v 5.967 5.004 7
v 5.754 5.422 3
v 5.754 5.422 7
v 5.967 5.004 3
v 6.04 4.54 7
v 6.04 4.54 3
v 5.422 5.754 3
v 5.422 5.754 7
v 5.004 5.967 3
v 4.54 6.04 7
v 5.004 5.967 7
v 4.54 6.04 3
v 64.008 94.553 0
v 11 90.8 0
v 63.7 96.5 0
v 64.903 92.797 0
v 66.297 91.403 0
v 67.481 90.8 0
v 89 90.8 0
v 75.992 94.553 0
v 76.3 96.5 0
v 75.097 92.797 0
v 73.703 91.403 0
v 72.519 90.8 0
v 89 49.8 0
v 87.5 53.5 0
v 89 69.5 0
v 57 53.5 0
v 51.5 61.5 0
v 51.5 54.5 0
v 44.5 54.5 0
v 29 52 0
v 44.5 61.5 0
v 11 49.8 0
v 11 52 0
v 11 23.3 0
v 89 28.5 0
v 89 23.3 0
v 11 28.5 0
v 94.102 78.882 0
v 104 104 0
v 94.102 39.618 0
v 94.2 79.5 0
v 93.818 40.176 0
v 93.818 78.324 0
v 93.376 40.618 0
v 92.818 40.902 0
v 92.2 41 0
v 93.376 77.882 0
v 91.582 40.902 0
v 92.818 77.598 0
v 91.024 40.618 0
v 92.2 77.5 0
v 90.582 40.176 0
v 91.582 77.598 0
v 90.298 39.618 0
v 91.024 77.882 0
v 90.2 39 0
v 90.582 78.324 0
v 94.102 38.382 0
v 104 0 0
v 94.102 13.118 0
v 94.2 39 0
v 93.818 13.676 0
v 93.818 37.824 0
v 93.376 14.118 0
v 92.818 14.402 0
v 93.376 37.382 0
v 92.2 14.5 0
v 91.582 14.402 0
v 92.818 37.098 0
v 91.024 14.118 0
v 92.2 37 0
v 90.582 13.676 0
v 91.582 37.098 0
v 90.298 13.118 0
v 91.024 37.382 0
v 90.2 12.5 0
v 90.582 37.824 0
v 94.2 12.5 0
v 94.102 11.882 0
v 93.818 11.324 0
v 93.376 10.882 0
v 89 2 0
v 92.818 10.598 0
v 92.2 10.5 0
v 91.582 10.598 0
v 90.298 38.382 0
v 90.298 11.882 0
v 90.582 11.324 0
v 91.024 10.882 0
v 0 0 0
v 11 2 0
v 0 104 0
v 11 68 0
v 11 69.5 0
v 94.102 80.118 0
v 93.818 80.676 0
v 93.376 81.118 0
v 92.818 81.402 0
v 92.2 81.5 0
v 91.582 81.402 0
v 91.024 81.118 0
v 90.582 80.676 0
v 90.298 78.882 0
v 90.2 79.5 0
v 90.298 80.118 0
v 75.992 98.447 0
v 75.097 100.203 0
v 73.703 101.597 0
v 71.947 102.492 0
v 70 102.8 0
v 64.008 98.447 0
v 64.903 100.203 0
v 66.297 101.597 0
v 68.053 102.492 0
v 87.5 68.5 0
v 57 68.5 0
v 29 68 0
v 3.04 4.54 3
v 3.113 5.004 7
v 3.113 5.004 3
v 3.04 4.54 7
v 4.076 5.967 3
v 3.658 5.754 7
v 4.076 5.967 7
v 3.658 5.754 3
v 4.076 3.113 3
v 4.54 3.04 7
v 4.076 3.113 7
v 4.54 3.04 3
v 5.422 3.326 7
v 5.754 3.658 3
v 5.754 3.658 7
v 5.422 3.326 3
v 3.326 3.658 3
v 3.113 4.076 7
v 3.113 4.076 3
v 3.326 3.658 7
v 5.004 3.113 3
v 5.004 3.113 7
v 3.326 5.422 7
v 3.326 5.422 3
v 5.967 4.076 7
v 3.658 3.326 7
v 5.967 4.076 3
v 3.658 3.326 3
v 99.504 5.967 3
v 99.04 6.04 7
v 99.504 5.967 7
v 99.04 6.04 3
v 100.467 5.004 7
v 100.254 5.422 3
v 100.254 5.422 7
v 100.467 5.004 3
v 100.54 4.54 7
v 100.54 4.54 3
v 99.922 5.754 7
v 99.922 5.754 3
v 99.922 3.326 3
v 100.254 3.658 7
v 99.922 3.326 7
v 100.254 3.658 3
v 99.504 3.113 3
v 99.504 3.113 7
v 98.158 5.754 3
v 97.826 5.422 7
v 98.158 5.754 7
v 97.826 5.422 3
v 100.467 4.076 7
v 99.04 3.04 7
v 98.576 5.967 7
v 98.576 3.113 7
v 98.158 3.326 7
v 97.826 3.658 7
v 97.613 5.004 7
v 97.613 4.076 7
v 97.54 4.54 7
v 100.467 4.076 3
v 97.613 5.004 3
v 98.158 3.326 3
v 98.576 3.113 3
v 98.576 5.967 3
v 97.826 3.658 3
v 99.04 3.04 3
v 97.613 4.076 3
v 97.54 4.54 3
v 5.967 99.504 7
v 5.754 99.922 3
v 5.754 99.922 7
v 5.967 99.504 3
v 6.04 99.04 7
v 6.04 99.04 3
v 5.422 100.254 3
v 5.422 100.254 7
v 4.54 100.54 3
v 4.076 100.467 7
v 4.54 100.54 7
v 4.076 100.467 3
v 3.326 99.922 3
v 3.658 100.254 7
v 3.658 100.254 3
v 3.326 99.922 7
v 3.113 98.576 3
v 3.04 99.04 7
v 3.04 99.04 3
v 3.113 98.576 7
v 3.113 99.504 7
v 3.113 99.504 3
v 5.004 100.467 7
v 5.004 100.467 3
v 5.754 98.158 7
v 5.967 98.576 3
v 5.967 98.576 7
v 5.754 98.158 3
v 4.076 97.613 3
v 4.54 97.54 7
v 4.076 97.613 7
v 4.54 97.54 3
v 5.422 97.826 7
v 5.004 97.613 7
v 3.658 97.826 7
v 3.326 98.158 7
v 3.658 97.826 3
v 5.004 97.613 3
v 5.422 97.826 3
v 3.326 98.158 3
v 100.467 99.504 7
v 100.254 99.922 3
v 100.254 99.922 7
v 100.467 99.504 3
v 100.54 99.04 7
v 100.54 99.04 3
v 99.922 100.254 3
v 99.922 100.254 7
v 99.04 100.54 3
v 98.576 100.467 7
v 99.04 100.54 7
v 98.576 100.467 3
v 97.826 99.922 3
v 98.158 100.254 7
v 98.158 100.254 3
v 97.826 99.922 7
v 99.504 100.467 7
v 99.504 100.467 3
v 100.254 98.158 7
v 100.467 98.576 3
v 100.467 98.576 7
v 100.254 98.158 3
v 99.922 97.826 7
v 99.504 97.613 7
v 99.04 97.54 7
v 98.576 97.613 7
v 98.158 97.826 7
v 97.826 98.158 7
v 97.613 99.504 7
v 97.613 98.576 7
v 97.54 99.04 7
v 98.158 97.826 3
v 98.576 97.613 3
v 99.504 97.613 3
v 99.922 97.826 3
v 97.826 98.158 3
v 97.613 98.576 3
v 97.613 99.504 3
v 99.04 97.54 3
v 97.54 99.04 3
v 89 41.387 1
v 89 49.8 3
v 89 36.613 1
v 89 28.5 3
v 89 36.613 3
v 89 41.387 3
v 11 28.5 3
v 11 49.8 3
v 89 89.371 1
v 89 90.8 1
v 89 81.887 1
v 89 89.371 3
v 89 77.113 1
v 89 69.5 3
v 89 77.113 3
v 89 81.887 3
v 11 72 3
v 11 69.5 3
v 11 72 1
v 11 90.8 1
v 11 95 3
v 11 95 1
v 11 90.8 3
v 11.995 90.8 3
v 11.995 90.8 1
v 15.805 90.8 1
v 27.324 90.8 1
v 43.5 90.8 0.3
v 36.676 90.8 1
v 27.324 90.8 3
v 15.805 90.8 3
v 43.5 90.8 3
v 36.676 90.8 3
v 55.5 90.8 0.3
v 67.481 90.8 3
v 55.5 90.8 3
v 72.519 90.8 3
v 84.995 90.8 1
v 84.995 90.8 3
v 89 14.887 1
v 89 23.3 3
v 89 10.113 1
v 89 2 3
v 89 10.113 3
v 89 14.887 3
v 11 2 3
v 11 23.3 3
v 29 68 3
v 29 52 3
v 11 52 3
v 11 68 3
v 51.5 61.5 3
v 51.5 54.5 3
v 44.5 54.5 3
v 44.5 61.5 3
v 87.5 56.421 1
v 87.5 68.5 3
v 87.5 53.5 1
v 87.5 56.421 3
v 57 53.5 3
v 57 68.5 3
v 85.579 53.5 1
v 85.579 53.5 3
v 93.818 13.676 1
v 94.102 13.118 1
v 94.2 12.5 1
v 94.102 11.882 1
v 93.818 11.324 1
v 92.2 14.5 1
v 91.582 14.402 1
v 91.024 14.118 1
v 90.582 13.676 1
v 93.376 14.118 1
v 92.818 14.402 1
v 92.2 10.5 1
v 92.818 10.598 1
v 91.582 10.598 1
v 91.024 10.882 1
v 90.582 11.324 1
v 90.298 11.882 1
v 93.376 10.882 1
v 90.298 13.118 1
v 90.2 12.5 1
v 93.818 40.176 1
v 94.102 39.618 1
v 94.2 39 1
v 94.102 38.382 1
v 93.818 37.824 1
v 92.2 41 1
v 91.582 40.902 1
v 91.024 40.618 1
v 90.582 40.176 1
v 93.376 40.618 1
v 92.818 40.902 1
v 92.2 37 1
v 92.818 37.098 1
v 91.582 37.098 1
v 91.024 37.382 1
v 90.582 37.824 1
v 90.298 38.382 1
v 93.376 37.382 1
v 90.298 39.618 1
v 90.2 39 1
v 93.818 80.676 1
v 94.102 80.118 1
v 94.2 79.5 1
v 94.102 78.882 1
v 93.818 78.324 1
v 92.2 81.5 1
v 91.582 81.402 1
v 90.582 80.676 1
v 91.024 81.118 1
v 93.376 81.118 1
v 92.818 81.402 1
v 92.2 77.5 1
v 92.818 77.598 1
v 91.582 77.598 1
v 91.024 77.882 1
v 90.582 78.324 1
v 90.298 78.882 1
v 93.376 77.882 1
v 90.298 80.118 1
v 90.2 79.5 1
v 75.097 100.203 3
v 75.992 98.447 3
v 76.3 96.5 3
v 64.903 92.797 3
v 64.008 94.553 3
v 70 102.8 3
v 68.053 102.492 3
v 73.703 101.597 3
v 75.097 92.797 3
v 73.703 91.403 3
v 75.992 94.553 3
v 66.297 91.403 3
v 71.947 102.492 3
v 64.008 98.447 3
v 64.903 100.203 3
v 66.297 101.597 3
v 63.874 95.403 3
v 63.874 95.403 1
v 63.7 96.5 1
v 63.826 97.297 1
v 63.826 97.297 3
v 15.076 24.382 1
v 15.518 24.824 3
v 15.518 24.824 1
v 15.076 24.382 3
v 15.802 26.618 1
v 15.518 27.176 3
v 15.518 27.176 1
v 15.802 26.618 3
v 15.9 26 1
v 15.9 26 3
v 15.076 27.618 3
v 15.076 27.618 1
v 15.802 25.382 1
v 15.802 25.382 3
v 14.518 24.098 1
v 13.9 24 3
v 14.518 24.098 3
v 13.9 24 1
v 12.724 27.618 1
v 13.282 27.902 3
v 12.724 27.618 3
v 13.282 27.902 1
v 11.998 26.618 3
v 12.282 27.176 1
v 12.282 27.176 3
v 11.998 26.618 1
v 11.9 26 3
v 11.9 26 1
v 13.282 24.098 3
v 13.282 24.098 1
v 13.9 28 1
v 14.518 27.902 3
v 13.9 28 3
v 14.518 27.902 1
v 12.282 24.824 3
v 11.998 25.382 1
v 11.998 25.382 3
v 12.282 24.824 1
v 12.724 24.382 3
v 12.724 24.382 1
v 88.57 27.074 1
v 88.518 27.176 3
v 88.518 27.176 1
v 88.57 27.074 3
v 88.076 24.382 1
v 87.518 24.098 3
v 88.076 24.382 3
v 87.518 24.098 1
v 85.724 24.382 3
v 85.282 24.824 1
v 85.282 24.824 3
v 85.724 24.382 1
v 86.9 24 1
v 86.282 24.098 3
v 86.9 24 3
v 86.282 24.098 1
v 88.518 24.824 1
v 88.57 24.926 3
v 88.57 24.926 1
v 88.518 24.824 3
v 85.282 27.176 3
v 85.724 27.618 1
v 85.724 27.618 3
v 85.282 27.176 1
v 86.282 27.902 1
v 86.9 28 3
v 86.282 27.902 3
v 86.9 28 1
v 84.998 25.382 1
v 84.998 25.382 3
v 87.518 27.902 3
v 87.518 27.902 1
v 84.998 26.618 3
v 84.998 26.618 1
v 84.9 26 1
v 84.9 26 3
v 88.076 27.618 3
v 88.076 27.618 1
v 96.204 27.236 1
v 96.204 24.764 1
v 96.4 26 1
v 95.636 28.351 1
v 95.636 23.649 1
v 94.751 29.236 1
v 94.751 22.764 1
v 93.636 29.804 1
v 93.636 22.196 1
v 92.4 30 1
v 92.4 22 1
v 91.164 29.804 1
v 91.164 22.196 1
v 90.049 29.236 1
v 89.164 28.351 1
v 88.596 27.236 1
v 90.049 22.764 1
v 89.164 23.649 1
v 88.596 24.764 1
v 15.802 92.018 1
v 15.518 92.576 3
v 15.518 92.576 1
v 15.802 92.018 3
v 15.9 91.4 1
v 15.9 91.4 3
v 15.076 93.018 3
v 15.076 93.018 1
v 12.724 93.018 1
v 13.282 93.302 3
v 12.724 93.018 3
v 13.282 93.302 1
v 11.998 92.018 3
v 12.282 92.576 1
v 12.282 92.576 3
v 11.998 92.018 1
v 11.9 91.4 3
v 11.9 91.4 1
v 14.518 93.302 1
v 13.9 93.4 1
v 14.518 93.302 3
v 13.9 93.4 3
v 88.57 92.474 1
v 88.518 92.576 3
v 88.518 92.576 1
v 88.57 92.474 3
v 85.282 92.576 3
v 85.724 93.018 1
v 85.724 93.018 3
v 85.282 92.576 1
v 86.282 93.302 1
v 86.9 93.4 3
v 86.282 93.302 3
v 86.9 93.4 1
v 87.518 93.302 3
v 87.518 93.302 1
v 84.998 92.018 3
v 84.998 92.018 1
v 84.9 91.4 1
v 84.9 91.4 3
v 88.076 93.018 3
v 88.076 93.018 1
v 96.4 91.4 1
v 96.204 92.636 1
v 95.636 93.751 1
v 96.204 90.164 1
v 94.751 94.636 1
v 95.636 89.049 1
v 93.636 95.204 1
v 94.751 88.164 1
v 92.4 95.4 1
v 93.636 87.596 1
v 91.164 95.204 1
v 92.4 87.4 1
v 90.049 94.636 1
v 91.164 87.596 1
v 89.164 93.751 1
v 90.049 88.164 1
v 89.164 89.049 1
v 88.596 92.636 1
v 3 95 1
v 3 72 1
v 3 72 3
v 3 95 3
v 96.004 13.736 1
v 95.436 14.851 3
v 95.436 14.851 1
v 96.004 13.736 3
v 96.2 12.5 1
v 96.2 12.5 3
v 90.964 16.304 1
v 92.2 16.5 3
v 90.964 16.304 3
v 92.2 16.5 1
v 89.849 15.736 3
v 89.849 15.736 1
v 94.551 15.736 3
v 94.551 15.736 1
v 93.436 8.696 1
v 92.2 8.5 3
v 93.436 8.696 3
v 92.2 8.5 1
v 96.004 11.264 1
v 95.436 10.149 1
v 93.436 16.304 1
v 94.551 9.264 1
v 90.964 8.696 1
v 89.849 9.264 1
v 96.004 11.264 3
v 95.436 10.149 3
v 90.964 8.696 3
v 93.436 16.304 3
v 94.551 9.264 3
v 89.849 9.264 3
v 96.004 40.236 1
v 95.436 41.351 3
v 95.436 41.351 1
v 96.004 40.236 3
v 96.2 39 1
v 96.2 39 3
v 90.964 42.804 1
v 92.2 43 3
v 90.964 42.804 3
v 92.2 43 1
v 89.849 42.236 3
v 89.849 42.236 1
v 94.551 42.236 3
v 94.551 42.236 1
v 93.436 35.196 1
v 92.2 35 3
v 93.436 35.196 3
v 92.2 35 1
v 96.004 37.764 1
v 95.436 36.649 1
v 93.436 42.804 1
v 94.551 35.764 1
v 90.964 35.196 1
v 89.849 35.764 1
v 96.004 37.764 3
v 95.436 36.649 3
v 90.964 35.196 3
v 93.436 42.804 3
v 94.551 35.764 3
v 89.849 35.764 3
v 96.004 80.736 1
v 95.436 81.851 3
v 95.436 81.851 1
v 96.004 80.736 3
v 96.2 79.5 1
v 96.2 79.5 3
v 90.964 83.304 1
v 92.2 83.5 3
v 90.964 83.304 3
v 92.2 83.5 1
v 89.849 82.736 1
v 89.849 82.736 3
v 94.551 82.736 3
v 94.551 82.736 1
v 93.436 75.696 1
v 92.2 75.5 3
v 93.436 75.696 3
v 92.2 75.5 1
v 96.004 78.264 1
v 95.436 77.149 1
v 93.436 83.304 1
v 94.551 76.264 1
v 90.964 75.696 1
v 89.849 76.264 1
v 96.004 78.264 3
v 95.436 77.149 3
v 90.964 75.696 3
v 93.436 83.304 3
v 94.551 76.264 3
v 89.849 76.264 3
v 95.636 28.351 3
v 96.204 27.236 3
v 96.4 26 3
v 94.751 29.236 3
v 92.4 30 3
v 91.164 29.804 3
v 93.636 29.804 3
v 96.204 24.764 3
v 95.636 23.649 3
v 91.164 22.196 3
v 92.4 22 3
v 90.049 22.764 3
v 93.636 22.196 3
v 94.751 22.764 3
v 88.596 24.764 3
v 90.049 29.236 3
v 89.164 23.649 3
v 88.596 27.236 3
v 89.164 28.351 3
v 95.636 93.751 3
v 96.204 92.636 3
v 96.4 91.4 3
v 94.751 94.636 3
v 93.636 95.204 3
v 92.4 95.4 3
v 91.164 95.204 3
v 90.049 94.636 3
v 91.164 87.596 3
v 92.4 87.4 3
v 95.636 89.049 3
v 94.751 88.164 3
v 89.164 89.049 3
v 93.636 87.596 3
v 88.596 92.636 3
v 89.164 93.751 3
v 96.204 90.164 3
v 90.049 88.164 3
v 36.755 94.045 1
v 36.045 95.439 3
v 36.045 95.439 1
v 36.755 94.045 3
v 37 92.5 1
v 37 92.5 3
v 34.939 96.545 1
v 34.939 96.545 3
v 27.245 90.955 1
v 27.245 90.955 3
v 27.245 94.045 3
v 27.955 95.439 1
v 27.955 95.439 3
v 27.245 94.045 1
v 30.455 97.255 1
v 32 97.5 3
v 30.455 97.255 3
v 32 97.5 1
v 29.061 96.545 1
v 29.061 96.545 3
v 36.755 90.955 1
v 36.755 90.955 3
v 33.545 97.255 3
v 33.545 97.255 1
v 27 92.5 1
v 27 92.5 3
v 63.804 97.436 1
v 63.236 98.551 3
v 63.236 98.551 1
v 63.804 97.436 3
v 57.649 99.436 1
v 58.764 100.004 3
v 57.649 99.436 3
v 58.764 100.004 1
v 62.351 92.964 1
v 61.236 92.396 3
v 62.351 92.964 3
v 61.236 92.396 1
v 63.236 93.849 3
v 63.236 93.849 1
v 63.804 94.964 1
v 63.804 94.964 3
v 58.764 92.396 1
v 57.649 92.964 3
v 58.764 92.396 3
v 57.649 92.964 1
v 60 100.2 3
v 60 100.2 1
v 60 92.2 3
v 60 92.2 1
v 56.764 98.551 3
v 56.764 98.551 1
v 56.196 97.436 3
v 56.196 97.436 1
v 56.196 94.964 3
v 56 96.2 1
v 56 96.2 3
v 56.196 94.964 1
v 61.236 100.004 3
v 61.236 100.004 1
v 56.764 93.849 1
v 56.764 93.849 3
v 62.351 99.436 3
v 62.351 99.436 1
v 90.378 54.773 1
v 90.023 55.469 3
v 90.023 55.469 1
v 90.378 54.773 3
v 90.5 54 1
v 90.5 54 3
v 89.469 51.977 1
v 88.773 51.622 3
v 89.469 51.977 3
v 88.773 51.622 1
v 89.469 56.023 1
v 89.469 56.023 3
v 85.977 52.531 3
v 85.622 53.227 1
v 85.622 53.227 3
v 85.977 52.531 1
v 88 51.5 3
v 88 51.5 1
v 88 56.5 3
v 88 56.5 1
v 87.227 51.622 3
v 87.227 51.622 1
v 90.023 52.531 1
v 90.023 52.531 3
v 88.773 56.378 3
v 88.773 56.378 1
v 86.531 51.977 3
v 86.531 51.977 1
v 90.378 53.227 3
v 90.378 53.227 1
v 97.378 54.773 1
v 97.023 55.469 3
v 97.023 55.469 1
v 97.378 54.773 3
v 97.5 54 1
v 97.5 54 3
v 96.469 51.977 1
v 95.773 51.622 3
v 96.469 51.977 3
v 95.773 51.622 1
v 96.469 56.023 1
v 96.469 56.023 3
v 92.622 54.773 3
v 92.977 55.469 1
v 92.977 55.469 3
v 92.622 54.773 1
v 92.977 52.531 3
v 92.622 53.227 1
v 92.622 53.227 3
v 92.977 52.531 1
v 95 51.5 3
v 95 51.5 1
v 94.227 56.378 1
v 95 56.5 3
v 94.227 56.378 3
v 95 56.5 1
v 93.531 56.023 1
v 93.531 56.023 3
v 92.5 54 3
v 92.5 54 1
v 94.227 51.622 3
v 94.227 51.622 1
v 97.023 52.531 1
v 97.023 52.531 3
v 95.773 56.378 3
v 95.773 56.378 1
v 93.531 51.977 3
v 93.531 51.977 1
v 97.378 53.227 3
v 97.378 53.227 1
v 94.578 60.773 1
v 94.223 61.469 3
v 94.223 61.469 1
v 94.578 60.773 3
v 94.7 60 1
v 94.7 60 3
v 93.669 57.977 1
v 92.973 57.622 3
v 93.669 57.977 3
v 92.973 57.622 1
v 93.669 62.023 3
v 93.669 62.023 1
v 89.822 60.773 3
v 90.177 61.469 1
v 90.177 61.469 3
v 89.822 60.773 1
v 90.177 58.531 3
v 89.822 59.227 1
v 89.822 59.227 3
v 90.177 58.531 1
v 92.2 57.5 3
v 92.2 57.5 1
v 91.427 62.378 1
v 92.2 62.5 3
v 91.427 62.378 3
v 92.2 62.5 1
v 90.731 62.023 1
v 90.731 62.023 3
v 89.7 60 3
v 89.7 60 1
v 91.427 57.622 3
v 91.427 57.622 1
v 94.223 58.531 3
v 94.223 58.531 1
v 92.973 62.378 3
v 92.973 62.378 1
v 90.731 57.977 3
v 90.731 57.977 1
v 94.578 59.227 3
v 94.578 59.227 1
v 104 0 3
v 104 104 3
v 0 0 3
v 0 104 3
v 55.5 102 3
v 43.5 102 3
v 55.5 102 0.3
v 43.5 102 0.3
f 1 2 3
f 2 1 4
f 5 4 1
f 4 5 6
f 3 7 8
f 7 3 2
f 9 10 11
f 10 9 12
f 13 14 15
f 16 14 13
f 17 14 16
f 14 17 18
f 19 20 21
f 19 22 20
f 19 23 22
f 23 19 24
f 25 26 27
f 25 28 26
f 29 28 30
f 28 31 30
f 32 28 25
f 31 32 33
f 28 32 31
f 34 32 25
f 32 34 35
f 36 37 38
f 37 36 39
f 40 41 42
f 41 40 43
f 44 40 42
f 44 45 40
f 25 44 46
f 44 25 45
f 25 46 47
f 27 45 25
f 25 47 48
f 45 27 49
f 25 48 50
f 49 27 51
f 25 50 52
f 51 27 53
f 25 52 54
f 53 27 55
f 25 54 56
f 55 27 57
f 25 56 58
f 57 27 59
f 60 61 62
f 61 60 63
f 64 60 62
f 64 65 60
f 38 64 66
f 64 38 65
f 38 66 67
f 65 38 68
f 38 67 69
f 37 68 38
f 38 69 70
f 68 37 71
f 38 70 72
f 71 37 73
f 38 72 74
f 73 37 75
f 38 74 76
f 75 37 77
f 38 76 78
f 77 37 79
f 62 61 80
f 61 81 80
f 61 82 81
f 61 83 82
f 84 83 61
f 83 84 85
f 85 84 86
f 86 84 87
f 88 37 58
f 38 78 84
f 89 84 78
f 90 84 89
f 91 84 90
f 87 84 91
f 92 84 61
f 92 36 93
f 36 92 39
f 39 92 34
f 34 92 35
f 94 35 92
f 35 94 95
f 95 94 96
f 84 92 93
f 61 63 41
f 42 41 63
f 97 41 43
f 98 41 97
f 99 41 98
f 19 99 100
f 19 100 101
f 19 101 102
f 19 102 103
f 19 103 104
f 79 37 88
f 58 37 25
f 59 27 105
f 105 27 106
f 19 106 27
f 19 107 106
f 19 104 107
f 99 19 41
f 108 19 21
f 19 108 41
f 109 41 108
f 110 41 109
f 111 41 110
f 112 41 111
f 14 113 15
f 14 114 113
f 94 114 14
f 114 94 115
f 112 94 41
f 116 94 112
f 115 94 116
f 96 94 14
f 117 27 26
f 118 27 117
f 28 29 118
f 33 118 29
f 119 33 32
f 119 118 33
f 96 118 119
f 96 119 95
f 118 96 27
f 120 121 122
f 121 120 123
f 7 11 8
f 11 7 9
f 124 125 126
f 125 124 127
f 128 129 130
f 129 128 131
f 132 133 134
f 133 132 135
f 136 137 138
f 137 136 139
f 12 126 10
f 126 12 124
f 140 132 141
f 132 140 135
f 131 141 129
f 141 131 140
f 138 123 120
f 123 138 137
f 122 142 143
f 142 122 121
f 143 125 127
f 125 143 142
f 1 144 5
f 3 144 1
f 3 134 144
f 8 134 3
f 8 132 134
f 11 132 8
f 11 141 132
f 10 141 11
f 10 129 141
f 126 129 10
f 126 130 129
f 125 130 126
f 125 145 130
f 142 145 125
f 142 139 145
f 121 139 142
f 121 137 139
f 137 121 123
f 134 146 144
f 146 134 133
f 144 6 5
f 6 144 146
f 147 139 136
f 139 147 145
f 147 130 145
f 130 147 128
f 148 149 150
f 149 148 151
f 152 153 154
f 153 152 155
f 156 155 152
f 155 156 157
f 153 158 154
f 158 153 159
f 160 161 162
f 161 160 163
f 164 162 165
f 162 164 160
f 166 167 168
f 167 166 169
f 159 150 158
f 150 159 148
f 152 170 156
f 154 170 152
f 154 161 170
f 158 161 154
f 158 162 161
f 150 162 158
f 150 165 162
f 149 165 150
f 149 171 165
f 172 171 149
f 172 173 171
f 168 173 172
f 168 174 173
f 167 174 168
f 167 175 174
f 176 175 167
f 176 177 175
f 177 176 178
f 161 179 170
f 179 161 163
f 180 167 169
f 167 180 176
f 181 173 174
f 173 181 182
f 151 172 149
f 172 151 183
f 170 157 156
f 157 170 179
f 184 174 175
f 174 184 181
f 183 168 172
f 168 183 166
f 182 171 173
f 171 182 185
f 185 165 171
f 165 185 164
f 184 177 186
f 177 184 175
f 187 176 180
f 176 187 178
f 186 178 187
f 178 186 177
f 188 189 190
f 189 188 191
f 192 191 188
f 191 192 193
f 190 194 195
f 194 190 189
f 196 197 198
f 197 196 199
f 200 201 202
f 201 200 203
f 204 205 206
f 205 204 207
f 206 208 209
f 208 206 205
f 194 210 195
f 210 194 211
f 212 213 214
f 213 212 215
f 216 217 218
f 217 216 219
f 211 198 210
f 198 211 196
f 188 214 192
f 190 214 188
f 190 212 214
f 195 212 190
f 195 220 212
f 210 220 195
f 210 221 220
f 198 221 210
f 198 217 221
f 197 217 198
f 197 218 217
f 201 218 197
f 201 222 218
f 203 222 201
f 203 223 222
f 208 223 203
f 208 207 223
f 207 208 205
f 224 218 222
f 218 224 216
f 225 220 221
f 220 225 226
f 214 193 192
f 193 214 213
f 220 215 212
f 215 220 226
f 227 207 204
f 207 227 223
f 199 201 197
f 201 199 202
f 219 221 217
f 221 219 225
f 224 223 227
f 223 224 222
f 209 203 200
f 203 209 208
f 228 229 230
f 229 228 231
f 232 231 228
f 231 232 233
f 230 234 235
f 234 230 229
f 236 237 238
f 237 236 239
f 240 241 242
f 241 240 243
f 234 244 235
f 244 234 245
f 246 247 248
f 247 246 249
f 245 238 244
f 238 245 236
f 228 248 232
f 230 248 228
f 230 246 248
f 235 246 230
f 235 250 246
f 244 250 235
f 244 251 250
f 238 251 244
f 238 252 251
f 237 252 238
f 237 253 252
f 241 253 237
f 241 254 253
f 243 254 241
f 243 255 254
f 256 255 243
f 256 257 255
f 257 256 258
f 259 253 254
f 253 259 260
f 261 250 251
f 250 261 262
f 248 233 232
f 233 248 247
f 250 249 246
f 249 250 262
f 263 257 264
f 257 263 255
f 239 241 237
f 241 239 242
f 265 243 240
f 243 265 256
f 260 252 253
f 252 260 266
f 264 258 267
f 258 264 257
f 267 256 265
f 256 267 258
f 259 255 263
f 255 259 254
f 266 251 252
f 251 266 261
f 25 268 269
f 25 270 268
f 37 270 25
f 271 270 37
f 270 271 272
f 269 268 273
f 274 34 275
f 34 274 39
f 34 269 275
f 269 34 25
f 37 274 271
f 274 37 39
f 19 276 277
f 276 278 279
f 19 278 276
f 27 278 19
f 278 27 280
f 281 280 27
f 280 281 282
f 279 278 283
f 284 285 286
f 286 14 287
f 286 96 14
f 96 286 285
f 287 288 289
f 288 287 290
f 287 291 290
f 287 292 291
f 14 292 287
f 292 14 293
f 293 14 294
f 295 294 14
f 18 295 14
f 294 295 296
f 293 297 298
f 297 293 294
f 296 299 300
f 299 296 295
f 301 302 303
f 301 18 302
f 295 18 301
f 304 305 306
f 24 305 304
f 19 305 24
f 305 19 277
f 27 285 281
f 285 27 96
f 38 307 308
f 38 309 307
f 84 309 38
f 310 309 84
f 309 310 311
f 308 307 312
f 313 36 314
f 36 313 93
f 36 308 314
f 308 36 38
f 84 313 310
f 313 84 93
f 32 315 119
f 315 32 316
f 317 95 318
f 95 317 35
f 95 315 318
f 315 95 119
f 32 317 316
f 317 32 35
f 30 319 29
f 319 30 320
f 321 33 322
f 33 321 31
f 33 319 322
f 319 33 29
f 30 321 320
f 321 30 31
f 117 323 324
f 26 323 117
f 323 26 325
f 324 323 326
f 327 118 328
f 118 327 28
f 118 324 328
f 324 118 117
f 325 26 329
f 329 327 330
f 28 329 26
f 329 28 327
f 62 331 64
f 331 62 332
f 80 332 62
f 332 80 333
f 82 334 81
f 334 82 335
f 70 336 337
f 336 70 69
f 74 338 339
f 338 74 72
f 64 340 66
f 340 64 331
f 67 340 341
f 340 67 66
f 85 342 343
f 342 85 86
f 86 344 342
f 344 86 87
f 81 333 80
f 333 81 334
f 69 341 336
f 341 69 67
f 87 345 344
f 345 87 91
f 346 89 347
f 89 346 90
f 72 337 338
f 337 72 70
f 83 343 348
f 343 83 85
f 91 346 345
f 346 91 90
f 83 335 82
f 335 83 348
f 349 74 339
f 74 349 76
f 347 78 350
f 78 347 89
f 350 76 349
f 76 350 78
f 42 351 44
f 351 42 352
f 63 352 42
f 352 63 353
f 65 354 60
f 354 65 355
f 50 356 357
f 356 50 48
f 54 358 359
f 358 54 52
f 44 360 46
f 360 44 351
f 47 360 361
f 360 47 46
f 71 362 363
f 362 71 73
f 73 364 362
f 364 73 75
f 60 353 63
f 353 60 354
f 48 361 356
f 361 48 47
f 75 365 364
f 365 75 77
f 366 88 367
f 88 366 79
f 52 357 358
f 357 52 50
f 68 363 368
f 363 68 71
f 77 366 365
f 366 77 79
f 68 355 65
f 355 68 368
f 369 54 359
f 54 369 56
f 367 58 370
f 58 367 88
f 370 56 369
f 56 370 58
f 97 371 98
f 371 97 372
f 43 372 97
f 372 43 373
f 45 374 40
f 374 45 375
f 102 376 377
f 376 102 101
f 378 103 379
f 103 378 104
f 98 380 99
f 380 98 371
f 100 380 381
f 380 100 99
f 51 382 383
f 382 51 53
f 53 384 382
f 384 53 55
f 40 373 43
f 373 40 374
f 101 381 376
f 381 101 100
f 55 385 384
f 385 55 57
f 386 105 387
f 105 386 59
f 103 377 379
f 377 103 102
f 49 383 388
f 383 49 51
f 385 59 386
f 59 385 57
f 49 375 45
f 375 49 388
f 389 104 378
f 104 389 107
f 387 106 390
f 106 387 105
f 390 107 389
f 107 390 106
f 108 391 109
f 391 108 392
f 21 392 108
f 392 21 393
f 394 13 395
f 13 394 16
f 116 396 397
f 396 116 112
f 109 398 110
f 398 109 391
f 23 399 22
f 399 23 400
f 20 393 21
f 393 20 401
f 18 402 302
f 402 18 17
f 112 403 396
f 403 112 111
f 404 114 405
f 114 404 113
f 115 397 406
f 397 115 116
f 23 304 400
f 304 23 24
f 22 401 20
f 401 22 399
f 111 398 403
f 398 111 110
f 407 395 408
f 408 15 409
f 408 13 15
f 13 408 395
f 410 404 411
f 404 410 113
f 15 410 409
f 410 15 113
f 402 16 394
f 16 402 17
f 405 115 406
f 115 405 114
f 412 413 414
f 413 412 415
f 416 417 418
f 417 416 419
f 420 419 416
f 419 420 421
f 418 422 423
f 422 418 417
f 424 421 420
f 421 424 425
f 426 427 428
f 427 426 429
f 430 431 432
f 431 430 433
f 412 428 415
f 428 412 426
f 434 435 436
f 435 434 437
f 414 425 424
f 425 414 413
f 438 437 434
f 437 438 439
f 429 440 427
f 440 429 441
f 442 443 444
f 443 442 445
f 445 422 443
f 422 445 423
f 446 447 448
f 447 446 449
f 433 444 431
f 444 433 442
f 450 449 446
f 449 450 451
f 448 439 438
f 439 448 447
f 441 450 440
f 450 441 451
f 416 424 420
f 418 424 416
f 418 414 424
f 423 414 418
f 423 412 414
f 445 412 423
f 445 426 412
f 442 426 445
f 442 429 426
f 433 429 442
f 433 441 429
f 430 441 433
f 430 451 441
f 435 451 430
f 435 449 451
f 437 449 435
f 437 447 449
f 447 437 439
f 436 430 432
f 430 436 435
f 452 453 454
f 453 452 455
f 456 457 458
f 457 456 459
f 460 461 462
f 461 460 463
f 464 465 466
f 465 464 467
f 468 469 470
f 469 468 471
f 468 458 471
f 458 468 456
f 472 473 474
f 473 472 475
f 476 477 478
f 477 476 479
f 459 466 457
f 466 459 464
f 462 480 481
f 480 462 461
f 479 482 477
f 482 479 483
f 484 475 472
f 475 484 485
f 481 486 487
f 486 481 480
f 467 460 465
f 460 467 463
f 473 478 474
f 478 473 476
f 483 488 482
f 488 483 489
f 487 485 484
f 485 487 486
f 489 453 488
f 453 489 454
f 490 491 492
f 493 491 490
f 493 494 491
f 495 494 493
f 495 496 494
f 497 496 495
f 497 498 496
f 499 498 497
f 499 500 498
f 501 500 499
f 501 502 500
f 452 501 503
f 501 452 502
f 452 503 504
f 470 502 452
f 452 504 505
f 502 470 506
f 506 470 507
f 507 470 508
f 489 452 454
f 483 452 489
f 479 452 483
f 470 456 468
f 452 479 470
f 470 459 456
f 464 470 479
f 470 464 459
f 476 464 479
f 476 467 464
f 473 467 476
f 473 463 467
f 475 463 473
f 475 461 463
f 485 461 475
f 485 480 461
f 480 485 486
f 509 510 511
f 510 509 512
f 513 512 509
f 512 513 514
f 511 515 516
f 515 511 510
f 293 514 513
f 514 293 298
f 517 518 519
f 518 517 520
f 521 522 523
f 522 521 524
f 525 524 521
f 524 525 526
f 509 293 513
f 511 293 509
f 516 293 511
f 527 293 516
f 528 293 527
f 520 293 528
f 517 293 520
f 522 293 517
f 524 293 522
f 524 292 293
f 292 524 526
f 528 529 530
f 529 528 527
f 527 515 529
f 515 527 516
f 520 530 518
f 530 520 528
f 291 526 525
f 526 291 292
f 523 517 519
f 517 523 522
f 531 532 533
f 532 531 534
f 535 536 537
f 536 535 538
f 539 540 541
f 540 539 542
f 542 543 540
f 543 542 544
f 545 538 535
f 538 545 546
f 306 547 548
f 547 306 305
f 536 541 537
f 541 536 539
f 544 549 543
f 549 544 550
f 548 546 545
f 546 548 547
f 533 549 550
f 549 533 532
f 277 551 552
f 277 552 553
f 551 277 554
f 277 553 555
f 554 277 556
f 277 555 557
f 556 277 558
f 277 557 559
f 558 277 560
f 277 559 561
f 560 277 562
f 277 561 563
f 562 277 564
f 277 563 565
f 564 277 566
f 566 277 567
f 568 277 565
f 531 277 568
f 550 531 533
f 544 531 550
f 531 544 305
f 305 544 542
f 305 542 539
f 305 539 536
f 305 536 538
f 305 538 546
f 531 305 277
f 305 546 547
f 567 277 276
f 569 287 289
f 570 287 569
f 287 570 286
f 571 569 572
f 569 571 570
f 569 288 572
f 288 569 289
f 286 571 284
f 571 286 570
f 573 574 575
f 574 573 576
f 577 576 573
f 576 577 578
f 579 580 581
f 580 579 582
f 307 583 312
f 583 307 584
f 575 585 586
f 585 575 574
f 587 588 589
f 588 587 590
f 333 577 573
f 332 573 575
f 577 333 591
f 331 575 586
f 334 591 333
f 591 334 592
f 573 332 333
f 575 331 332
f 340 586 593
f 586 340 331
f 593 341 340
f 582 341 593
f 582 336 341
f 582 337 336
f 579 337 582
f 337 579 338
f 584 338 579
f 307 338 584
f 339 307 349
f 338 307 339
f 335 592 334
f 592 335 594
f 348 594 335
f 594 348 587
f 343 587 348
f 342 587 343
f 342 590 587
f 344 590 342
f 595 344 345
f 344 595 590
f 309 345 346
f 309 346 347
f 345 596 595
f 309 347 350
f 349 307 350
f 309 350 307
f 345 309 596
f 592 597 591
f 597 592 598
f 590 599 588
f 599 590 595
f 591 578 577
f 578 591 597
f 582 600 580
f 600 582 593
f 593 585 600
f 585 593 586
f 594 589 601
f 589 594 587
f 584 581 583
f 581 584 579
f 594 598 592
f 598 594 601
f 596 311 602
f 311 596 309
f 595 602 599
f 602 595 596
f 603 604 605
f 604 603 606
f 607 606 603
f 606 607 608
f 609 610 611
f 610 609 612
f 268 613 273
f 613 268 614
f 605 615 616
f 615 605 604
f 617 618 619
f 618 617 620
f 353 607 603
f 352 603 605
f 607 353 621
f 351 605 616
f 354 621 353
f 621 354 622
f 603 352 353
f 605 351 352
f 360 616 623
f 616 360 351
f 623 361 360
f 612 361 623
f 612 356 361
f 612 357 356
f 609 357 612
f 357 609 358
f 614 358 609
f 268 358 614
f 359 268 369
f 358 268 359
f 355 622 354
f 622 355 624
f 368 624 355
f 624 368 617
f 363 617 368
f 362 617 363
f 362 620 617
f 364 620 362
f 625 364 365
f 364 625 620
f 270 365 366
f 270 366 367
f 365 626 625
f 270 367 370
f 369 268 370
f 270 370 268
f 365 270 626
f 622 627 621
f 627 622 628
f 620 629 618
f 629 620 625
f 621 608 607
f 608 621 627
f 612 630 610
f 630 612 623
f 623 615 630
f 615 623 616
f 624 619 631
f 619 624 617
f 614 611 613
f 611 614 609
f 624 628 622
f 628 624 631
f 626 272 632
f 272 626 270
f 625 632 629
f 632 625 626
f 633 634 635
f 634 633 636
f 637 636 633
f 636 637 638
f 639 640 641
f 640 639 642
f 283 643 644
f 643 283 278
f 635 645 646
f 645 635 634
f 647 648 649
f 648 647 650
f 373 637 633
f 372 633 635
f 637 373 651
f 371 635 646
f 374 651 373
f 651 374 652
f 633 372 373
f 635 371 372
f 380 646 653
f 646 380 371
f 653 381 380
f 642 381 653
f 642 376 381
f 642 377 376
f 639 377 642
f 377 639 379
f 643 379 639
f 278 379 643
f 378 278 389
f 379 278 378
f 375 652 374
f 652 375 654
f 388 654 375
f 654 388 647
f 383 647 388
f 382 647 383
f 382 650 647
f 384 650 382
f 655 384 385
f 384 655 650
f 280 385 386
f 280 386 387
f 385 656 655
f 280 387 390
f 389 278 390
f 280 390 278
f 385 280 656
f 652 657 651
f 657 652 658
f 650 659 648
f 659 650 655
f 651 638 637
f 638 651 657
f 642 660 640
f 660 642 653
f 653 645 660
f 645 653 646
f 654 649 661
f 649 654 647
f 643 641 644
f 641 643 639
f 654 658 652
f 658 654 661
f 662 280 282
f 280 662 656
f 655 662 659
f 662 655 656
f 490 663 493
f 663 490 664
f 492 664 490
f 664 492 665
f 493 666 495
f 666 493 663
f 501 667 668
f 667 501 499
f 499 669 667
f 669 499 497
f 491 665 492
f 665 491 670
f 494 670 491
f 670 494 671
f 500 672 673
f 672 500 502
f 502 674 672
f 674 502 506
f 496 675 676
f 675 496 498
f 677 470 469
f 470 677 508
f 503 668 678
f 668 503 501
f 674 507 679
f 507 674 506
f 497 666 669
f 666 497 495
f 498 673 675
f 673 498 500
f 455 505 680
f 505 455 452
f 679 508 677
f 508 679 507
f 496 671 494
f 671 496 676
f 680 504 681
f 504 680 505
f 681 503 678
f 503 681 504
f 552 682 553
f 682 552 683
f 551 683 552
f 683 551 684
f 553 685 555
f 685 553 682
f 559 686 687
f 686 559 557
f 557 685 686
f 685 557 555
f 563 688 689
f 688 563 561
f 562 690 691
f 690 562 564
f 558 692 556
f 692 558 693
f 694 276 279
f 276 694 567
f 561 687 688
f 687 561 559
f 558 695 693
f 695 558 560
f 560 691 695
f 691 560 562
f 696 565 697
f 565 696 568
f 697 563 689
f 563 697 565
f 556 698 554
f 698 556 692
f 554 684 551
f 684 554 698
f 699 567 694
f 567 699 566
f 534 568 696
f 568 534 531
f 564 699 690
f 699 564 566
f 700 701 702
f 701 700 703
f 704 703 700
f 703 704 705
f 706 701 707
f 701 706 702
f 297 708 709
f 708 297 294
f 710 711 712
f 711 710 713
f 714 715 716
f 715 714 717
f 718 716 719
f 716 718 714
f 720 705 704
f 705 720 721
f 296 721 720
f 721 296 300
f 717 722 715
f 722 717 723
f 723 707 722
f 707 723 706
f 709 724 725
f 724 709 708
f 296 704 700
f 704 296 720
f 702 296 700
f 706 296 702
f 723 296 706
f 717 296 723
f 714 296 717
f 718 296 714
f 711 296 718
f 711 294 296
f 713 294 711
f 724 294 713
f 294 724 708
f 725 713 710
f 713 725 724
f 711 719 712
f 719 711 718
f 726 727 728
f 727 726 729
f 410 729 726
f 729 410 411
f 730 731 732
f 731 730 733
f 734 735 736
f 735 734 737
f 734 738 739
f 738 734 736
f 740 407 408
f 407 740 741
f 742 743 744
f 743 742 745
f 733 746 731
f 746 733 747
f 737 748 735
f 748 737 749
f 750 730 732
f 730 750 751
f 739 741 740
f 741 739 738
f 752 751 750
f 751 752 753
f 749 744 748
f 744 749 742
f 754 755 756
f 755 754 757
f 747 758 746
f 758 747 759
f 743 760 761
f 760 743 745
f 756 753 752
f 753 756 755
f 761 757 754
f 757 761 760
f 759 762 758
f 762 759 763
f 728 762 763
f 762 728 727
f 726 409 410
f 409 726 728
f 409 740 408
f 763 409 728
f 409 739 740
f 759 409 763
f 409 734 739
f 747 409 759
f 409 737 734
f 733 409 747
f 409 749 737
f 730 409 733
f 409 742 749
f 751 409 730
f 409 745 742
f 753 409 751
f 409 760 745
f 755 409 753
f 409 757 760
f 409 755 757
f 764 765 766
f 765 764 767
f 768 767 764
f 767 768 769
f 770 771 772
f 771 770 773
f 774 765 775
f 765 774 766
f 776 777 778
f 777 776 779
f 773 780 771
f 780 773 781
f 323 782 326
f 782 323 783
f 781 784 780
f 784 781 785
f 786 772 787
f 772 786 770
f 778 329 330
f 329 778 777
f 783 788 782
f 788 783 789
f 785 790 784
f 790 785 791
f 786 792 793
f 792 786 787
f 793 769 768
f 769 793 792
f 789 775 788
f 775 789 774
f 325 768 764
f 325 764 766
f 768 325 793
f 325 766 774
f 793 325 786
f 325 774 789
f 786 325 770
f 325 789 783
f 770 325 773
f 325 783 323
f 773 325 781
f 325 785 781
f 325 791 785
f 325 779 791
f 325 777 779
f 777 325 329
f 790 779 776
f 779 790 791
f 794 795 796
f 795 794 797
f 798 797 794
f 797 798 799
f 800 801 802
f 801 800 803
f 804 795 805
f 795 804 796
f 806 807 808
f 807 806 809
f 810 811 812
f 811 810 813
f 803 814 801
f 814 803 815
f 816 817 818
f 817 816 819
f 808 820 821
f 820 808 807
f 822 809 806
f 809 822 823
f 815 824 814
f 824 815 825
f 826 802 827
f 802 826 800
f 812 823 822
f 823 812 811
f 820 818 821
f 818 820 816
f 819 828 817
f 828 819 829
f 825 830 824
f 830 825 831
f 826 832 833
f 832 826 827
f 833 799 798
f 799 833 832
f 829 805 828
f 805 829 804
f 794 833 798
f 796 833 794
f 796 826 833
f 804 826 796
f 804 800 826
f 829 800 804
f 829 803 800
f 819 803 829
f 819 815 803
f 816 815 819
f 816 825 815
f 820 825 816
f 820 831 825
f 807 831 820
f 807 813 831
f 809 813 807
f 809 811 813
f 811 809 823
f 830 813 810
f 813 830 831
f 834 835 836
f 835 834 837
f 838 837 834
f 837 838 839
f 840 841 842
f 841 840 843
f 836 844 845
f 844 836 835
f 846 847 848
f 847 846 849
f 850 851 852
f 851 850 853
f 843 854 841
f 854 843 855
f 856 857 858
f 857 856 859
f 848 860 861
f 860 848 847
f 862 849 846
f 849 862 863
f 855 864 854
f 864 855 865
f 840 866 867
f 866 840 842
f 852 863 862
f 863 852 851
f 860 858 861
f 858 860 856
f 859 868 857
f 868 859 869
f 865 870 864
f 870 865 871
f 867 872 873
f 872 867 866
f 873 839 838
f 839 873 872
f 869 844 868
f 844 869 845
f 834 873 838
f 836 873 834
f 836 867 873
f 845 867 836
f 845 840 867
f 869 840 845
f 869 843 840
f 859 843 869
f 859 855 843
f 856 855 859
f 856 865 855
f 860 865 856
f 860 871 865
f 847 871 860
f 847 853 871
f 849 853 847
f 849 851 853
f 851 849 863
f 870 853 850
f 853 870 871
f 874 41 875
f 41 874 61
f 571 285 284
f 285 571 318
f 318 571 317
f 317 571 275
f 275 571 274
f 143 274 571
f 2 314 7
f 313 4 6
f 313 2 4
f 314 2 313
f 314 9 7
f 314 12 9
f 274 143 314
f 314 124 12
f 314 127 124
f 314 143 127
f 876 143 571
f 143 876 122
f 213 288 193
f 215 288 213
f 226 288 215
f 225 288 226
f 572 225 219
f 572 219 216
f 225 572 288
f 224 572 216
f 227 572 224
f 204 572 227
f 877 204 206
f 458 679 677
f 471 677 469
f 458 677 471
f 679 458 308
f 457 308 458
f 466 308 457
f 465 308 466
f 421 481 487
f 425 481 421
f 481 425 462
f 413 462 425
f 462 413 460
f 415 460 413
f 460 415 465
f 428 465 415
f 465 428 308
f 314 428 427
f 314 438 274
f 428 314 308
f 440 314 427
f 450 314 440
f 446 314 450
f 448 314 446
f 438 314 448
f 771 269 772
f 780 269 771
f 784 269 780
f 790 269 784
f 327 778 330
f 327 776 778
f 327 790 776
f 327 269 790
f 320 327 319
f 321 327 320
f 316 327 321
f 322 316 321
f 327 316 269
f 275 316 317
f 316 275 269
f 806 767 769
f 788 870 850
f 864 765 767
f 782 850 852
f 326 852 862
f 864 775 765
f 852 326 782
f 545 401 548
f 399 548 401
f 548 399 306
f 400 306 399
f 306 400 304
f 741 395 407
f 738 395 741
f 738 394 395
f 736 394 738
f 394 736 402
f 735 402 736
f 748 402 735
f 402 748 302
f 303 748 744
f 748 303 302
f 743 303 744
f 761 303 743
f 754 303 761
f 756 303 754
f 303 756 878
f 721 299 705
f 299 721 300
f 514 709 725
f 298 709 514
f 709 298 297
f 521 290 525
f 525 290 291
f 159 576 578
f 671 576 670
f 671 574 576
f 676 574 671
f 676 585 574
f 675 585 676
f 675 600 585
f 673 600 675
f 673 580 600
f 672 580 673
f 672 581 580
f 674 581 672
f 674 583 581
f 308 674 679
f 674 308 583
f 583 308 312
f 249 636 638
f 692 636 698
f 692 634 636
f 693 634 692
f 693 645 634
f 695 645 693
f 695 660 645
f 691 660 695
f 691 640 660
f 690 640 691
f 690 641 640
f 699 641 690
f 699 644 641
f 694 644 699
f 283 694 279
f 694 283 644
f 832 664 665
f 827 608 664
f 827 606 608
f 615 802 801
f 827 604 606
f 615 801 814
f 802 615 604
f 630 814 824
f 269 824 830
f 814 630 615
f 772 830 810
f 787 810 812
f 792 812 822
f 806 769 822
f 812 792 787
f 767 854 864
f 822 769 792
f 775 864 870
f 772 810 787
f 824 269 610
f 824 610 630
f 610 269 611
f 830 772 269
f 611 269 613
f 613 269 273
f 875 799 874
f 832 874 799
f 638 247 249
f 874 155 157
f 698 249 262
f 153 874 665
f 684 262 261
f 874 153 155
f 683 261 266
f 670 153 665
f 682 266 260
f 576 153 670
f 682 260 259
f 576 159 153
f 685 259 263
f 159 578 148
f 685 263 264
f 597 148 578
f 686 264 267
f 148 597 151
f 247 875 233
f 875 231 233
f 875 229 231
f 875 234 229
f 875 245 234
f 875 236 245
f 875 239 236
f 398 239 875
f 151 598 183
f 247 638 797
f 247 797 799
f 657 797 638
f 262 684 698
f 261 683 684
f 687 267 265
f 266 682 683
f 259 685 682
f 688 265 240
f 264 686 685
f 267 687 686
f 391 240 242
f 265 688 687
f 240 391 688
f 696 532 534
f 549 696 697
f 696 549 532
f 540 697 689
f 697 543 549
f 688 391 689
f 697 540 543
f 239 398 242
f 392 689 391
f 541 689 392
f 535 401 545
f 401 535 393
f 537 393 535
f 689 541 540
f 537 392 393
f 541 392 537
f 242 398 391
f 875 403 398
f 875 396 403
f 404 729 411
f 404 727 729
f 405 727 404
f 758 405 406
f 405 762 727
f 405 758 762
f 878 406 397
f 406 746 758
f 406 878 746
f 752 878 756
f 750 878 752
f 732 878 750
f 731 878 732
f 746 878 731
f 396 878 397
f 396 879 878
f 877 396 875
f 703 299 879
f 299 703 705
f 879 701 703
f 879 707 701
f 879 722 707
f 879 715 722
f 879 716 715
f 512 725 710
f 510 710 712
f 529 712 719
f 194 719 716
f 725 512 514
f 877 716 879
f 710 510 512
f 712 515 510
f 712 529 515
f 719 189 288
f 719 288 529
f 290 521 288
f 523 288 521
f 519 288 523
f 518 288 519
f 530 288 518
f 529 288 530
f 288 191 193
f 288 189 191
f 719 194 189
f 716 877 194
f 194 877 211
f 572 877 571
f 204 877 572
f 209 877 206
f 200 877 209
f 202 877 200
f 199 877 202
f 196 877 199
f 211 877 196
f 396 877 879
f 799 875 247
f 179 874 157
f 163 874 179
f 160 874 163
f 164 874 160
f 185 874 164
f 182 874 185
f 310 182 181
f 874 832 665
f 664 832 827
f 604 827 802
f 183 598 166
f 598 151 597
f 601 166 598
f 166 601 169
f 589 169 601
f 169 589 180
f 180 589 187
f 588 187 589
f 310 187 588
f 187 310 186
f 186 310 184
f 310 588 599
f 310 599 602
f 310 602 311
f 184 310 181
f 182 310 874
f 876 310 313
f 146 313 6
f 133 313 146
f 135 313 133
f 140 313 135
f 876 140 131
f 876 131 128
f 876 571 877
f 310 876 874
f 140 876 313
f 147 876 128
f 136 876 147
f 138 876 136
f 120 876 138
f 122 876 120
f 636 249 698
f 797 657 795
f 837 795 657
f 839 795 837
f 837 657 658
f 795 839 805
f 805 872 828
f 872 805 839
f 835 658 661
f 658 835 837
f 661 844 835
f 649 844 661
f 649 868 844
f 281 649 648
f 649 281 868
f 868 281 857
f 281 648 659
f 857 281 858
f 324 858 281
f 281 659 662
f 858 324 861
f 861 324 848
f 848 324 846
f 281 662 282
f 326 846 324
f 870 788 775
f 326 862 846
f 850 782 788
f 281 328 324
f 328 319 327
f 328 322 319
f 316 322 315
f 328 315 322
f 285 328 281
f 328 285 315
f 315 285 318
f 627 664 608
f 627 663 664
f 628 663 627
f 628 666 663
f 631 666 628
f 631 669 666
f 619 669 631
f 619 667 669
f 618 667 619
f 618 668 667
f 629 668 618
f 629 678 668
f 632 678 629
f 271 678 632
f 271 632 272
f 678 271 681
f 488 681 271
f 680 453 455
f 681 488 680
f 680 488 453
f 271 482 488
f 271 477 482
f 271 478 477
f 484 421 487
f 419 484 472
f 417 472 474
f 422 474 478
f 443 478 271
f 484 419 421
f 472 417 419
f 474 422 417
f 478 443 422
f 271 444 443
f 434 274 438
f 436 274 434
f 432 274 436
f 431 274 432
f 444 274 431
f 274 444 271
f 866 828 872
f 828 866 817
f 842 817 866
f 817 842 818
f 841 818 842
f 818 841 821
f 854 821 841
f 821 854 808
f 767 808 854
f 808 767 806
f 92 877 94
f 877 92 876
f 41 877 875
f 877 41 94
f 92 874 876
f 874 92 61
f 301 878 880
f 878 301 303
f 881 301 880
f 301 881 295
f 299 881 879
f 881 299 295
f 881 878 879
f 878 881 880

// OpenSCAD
//009
$fn=20;
pcbx=100;
pcby=100;
bh=2;

translate([bh,bh,0]) translate([2.54,2.54,0]) {
 cylinder(h=7,r=1.5);
translate([94.5,0,0]) 
 cylinder(h=7,r=1.5);
translate([0,94.5,0]) 
 cylinder(h=7,r=1.5);
translate([94.5,94.5,0]) 
 cylinder(h=7,r=1.5);
}

difference(){
cube([pcbx+bh+bh,pcby+bh+bh,3]);
translate([bh,bh,0]) {


translate([9,26.5,0]) cube([78,21.3,4]); //B3
translate([9,67.5,0]) cube([78,21.3,4]); //B4
translate([9,0,0]) cube([78,21.3,4]);  //b5
translate([9,50,0]) cube([18,16,4]);   //label
translate([46,56,0]) cube([7,7,4*2],true);  // reset switch  y=50
translate([55,51.5,0]) cube([30.5,15,4]);  //usbcom

translate([90.2,10.5,0]) cylinder(h=4,r=2);//led3
translate([90.2,37,0]) cylinder(h=4,r=2);//led4
translate([90.2,77.5,0]) cylinder(h=4,r=2);//led5


translate([68,94.5,0]) cylinder(h=4,r=6.3);//bat
}
translate([bh,bh,0.3]) {
translate([41.5,88,0]) cube([12,12,4]);//U9
}
translate([bh,bh,1]){
translate([1,70,0]) cube([8,23,4]); //s2 s3
translate([90.2,10.5,0]) cylinder(h=4,r=4);//led3
translate([90.2,37,0]) cylinder(h=4,r=4);//led4
translate([90.2,77.5,0]) cylinder(h=4,r=4);//led5

translate([11.9,100-76,0])  {
cylinder(h=4,r=2);//B2
translate([73,0,0]) cylinder(h=4,r=2);//B2
}

translate([11.9,100-10.6,0])  {
cylinder(h=4,r=2);//B1
translate([73,0,0]) cylinder(h=4,r=2);//B1
}

translate([90.4,100-76,0]) cylinder(h=4,r=4);//led2
translate([90.4,100-10.6,0]) cylinder(h=4,r=4);//led1

translate([30,100-9.5,0]) cylinder(h=4,r=5);//r24,r3

translate([58,100-5.8,0]) cylinder(h=4,r=4);//d1

translate([86,100-48,0]) cylinder(h=4,r=2.5);//power
translate([93,100-48,0]) cylinder(h=4,r=2.5);//power
translate([90.2,100-42,0]) cylinder(h=4,r=2.5);//power
}
}
